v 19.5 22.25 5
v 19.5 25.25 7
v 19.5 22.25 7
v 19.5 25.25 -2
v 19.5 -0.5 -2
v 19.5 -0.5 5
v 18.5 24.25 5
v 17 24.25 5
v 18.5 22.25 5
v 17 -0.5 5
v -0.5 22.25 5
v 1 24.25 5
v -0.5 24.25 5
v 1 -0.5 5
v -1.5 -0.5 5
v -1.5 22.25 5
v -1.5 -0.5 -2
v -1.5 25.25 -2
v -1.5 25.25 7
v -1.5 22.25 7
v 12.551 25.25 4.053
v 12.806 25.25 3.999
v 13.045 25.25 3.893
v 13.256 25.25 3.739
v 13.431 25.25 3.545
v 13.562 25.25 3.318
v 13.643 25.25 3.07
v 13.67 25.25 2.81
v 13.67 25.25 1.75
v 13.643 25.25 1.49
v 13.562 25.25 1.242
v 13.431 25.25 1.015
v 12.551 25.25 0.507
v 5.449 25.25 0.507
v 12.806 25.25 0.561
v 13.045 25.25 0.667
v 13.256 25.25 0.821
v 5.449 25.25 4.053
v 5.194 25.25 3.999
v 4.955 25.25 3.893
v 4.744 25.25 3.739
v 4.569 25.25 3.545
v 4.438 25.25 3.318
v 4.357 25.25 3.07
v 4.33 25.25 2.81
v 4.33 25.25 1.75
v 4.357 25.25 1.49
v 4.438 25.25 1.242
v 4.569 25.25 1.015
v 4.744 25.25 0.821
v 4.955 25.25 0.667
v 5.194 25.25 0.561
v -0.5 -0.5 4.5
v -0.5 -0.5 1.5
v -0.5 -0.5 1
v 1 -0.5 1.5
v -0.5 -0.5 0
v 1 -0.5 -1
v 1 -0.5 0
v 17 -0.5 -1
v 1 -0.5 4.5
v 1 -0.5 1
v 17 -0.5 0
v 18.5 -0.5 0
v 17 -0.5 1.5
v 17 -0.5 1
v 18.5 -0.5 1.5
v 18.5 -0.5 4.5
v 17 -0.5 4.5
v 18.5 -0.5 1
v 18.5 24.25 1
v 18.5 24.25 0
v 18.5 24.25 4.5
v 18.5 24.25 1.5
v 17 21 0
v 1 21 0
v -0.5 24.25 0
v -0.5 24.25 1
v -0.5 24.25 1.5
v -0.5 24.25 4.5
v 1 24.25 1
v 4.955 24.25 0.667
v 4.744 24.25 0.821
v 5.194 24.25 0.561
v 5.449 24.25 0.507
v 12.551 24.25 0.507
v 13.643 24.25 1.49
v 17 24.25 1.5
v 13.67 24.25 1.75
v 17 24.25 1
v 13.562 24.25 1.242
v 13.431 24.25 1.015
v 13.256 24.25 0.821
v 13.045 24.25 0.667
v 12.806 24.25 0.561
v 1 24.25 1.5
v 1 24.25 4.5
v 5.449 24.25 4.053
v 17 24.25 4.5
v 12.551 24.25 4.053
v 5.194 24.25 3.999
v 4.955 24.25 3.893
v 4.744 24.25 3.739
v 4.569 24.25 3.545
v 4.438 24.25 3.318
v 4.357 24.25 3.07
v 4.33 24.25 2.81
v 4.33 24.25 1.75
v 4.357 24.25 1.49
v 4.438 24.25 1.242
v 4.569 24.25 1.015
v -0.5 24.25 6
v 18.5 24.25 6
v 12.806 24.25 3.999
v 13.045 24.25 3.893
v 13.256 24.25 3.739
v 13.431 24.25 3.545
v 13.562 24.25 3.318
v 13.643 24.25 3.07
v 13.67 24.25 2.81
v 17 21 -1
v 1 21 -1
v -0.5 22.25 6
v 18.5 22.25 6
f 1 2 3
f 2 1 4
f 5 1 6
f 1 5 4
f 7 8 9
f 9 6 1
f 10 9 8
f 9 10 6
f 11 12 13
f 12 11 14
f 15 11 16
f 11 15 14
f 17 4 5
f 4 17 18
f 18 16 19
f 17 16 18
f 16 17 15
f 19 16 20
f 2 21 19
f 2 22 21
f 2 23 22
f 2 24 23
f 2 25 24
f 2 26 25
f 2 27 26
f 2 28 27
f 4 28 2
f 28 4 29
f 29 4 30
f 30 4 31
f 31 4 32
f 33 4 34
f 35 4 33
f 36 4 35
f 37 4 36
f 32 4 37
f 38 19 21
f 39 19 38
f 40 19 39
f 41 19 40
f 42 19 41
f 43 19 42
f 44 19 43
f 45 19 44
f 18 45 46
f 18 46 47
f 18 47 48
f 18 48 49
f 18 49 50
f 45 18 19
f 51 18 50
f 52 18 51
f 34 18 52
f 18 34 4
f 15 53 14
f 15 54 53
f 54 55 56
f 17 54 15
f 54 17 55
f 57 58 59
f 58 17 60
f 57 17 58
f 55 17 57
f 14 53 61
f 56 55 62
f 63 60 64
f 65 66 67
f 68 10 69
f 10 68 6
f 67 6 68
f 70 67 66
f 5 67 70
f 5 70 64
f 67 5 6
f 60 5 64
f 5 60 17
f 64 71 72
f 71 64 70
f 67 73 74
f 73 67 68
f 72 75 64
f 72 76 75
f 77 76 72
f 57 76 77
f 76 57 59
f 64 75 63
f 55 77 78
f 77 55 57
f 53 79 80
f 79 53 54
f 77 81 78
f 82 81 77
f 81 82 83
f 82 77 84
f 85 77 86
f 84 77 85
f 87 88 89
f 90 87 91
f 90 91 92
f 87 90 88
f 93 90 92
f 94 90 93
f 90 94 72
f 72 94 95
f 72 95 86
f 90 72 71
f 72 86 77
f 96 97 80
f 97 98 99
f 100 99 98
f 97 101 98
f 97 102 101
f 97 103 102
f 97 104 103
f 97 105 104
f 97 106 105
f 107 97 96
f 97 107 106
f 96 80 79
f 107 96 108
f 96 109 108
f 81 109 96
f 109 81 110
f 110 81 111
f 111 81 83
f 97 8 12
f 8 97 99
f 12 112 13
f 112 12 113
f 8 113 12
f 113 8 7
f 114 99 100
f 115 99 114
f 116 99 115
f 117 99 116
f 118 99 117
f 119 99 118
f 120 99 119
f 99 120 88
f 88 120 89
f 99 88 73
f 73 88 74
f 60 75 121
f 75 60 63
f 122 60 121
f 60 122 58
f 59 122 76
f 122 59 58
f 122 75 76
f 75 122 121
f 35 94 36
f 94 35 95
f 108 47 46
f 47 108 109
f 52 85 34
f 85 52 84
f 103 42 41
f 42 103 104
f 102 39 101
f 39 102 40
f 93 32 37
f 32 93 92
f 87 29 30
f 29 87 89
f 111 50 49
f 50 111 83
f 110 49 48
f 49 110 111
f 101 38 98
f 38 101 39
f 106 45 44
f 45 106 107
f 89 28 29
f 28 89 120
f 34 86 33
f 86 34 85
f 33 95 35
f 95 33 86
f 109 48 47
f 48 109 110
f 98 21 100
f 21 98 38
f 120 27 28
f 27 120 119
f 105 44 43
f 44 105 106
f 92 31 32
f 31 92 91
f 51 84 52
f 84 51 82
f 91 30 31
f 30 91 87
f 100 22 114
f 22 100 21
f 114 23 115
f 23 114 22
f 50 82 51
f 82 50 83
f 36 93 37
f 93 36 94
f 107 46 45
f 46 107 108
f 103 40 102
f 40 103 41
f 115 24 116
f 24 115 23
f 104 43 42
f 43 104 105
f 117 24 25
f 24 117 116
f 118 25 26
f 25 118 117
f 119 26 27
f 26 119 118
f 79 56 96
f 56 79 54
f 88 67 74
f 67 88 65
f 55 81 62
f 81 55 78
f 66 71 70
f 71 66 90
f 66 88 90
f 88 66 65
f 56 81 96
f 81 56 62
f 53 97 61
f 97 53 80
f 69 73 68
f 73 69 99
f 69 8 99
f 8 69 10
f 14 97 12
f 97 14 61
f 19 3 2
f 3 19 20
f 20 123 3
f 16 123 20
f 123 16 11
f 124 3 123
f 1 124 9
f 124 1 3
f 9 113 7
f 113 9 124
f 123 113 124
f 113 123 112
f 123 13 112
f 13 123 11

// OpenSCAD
// RP2350-Zero case shell
// The Waveshare model is proprietary (STEP converted to STL with FreeCAD)
// and is not part of this file. Set show_model = true to overlay it for fit checks.

show_model = false;

// Dimensions
rp_board = [18, 23.5];      // [X width, Y length]
usb_c_w  = 8.34 + 1;        // cutout width incl. clearance
usb_c_h  = 2.56 + 1;        // cutout height incl. clearance
usb_c_r  = 1.25;            // cutout corner radius

shell_w  = rp_board.x + 3;
shell_l  = rp_board.y + 2.25;
shell_y0 = -0.5;            // front face of the shell
floor_t  = 2;
cavity_h = 5;
rail_t   = 0.5;
rail_z_low  = 1;
rail_z_high = cavity_h - rail_t;

eps = 0.1;                  // overshoot so boolean cuts never share faces
$fs = 0.1;

// Cube centered on the board's X axis; y and z start at the origin like a normal cube
module cube_cx(size) {
    translate([rp_board.x / 2 - size.x / 2, 0, 0]) cube(size);
}

module shell_body() {
    color([1, 0.5, 0])
    translate([0, shell_y0, -floor_t])
        cube_cx([shell_w, shell_l, floor_t + cavity_h]);
}

// Open at the front and top
module cavity() {
    color([1, 0.5, 0])
    translate([0, shell_y0 - eps, 0])
        cube_cx([rp_board.x + 1, rp_board.y + 1.25 + eps, cavity_h + eps]);
}

module underbelly() {
    color([1, 0, 0])
    translate([0, -1, -1])
        cube_cx([16, 22, 2]);
}

module type_c_cutout() {
    color([1, 0.5, 1])
    translate([rp_board.x / 2 - usb_c_w / 2, rp_board.y + 2, 0.5])
    hull()
        for (x = [usb_c_r, usb_c_w - usb_c_r],
             z = [usb_c_r, usb_c_h - usb_c_r])
            translate([x, 0, z])
                rotate([90, 0, 0])
                    cylinder(h = 5, r = usb_c_r);
}

// Two side rails with the center strip removed
module railing(z) {
    len = rp_board.y + 2;
    difference() {
        translate([0, shell_y0, z])
            cube_cx([shell_w, len, rail_t]);
        translate([0, shell_y0 - eps, z - eps])
            cube_cx([rp_board.x - 2, len + 2 * eps, rail_t + 2 * eps]);
    }
}

// Tab for lid insertion
module lid_tab() {
    translate([0, rp_board.y - 1.25, cavity_h])
    difference() {
        cube_cx([shell_w, 3, 2]);
        translate([0, -eps, -eps])
            cube_cx([rp_board.x + 1, 2 + eps, 1 + eps]);
    }
}

module case_shell() {
    difference() {
        shell_body();
        cavity();
        underbelly();
        type_c_cutout();
    }
    railing(rail_z_low);
    railing(rail_z_high);
    lid_tab();
}

case_shell();

if (show_model)
    %translate([0, 0.5, 1]) import("RP2350-Zero.stl");
